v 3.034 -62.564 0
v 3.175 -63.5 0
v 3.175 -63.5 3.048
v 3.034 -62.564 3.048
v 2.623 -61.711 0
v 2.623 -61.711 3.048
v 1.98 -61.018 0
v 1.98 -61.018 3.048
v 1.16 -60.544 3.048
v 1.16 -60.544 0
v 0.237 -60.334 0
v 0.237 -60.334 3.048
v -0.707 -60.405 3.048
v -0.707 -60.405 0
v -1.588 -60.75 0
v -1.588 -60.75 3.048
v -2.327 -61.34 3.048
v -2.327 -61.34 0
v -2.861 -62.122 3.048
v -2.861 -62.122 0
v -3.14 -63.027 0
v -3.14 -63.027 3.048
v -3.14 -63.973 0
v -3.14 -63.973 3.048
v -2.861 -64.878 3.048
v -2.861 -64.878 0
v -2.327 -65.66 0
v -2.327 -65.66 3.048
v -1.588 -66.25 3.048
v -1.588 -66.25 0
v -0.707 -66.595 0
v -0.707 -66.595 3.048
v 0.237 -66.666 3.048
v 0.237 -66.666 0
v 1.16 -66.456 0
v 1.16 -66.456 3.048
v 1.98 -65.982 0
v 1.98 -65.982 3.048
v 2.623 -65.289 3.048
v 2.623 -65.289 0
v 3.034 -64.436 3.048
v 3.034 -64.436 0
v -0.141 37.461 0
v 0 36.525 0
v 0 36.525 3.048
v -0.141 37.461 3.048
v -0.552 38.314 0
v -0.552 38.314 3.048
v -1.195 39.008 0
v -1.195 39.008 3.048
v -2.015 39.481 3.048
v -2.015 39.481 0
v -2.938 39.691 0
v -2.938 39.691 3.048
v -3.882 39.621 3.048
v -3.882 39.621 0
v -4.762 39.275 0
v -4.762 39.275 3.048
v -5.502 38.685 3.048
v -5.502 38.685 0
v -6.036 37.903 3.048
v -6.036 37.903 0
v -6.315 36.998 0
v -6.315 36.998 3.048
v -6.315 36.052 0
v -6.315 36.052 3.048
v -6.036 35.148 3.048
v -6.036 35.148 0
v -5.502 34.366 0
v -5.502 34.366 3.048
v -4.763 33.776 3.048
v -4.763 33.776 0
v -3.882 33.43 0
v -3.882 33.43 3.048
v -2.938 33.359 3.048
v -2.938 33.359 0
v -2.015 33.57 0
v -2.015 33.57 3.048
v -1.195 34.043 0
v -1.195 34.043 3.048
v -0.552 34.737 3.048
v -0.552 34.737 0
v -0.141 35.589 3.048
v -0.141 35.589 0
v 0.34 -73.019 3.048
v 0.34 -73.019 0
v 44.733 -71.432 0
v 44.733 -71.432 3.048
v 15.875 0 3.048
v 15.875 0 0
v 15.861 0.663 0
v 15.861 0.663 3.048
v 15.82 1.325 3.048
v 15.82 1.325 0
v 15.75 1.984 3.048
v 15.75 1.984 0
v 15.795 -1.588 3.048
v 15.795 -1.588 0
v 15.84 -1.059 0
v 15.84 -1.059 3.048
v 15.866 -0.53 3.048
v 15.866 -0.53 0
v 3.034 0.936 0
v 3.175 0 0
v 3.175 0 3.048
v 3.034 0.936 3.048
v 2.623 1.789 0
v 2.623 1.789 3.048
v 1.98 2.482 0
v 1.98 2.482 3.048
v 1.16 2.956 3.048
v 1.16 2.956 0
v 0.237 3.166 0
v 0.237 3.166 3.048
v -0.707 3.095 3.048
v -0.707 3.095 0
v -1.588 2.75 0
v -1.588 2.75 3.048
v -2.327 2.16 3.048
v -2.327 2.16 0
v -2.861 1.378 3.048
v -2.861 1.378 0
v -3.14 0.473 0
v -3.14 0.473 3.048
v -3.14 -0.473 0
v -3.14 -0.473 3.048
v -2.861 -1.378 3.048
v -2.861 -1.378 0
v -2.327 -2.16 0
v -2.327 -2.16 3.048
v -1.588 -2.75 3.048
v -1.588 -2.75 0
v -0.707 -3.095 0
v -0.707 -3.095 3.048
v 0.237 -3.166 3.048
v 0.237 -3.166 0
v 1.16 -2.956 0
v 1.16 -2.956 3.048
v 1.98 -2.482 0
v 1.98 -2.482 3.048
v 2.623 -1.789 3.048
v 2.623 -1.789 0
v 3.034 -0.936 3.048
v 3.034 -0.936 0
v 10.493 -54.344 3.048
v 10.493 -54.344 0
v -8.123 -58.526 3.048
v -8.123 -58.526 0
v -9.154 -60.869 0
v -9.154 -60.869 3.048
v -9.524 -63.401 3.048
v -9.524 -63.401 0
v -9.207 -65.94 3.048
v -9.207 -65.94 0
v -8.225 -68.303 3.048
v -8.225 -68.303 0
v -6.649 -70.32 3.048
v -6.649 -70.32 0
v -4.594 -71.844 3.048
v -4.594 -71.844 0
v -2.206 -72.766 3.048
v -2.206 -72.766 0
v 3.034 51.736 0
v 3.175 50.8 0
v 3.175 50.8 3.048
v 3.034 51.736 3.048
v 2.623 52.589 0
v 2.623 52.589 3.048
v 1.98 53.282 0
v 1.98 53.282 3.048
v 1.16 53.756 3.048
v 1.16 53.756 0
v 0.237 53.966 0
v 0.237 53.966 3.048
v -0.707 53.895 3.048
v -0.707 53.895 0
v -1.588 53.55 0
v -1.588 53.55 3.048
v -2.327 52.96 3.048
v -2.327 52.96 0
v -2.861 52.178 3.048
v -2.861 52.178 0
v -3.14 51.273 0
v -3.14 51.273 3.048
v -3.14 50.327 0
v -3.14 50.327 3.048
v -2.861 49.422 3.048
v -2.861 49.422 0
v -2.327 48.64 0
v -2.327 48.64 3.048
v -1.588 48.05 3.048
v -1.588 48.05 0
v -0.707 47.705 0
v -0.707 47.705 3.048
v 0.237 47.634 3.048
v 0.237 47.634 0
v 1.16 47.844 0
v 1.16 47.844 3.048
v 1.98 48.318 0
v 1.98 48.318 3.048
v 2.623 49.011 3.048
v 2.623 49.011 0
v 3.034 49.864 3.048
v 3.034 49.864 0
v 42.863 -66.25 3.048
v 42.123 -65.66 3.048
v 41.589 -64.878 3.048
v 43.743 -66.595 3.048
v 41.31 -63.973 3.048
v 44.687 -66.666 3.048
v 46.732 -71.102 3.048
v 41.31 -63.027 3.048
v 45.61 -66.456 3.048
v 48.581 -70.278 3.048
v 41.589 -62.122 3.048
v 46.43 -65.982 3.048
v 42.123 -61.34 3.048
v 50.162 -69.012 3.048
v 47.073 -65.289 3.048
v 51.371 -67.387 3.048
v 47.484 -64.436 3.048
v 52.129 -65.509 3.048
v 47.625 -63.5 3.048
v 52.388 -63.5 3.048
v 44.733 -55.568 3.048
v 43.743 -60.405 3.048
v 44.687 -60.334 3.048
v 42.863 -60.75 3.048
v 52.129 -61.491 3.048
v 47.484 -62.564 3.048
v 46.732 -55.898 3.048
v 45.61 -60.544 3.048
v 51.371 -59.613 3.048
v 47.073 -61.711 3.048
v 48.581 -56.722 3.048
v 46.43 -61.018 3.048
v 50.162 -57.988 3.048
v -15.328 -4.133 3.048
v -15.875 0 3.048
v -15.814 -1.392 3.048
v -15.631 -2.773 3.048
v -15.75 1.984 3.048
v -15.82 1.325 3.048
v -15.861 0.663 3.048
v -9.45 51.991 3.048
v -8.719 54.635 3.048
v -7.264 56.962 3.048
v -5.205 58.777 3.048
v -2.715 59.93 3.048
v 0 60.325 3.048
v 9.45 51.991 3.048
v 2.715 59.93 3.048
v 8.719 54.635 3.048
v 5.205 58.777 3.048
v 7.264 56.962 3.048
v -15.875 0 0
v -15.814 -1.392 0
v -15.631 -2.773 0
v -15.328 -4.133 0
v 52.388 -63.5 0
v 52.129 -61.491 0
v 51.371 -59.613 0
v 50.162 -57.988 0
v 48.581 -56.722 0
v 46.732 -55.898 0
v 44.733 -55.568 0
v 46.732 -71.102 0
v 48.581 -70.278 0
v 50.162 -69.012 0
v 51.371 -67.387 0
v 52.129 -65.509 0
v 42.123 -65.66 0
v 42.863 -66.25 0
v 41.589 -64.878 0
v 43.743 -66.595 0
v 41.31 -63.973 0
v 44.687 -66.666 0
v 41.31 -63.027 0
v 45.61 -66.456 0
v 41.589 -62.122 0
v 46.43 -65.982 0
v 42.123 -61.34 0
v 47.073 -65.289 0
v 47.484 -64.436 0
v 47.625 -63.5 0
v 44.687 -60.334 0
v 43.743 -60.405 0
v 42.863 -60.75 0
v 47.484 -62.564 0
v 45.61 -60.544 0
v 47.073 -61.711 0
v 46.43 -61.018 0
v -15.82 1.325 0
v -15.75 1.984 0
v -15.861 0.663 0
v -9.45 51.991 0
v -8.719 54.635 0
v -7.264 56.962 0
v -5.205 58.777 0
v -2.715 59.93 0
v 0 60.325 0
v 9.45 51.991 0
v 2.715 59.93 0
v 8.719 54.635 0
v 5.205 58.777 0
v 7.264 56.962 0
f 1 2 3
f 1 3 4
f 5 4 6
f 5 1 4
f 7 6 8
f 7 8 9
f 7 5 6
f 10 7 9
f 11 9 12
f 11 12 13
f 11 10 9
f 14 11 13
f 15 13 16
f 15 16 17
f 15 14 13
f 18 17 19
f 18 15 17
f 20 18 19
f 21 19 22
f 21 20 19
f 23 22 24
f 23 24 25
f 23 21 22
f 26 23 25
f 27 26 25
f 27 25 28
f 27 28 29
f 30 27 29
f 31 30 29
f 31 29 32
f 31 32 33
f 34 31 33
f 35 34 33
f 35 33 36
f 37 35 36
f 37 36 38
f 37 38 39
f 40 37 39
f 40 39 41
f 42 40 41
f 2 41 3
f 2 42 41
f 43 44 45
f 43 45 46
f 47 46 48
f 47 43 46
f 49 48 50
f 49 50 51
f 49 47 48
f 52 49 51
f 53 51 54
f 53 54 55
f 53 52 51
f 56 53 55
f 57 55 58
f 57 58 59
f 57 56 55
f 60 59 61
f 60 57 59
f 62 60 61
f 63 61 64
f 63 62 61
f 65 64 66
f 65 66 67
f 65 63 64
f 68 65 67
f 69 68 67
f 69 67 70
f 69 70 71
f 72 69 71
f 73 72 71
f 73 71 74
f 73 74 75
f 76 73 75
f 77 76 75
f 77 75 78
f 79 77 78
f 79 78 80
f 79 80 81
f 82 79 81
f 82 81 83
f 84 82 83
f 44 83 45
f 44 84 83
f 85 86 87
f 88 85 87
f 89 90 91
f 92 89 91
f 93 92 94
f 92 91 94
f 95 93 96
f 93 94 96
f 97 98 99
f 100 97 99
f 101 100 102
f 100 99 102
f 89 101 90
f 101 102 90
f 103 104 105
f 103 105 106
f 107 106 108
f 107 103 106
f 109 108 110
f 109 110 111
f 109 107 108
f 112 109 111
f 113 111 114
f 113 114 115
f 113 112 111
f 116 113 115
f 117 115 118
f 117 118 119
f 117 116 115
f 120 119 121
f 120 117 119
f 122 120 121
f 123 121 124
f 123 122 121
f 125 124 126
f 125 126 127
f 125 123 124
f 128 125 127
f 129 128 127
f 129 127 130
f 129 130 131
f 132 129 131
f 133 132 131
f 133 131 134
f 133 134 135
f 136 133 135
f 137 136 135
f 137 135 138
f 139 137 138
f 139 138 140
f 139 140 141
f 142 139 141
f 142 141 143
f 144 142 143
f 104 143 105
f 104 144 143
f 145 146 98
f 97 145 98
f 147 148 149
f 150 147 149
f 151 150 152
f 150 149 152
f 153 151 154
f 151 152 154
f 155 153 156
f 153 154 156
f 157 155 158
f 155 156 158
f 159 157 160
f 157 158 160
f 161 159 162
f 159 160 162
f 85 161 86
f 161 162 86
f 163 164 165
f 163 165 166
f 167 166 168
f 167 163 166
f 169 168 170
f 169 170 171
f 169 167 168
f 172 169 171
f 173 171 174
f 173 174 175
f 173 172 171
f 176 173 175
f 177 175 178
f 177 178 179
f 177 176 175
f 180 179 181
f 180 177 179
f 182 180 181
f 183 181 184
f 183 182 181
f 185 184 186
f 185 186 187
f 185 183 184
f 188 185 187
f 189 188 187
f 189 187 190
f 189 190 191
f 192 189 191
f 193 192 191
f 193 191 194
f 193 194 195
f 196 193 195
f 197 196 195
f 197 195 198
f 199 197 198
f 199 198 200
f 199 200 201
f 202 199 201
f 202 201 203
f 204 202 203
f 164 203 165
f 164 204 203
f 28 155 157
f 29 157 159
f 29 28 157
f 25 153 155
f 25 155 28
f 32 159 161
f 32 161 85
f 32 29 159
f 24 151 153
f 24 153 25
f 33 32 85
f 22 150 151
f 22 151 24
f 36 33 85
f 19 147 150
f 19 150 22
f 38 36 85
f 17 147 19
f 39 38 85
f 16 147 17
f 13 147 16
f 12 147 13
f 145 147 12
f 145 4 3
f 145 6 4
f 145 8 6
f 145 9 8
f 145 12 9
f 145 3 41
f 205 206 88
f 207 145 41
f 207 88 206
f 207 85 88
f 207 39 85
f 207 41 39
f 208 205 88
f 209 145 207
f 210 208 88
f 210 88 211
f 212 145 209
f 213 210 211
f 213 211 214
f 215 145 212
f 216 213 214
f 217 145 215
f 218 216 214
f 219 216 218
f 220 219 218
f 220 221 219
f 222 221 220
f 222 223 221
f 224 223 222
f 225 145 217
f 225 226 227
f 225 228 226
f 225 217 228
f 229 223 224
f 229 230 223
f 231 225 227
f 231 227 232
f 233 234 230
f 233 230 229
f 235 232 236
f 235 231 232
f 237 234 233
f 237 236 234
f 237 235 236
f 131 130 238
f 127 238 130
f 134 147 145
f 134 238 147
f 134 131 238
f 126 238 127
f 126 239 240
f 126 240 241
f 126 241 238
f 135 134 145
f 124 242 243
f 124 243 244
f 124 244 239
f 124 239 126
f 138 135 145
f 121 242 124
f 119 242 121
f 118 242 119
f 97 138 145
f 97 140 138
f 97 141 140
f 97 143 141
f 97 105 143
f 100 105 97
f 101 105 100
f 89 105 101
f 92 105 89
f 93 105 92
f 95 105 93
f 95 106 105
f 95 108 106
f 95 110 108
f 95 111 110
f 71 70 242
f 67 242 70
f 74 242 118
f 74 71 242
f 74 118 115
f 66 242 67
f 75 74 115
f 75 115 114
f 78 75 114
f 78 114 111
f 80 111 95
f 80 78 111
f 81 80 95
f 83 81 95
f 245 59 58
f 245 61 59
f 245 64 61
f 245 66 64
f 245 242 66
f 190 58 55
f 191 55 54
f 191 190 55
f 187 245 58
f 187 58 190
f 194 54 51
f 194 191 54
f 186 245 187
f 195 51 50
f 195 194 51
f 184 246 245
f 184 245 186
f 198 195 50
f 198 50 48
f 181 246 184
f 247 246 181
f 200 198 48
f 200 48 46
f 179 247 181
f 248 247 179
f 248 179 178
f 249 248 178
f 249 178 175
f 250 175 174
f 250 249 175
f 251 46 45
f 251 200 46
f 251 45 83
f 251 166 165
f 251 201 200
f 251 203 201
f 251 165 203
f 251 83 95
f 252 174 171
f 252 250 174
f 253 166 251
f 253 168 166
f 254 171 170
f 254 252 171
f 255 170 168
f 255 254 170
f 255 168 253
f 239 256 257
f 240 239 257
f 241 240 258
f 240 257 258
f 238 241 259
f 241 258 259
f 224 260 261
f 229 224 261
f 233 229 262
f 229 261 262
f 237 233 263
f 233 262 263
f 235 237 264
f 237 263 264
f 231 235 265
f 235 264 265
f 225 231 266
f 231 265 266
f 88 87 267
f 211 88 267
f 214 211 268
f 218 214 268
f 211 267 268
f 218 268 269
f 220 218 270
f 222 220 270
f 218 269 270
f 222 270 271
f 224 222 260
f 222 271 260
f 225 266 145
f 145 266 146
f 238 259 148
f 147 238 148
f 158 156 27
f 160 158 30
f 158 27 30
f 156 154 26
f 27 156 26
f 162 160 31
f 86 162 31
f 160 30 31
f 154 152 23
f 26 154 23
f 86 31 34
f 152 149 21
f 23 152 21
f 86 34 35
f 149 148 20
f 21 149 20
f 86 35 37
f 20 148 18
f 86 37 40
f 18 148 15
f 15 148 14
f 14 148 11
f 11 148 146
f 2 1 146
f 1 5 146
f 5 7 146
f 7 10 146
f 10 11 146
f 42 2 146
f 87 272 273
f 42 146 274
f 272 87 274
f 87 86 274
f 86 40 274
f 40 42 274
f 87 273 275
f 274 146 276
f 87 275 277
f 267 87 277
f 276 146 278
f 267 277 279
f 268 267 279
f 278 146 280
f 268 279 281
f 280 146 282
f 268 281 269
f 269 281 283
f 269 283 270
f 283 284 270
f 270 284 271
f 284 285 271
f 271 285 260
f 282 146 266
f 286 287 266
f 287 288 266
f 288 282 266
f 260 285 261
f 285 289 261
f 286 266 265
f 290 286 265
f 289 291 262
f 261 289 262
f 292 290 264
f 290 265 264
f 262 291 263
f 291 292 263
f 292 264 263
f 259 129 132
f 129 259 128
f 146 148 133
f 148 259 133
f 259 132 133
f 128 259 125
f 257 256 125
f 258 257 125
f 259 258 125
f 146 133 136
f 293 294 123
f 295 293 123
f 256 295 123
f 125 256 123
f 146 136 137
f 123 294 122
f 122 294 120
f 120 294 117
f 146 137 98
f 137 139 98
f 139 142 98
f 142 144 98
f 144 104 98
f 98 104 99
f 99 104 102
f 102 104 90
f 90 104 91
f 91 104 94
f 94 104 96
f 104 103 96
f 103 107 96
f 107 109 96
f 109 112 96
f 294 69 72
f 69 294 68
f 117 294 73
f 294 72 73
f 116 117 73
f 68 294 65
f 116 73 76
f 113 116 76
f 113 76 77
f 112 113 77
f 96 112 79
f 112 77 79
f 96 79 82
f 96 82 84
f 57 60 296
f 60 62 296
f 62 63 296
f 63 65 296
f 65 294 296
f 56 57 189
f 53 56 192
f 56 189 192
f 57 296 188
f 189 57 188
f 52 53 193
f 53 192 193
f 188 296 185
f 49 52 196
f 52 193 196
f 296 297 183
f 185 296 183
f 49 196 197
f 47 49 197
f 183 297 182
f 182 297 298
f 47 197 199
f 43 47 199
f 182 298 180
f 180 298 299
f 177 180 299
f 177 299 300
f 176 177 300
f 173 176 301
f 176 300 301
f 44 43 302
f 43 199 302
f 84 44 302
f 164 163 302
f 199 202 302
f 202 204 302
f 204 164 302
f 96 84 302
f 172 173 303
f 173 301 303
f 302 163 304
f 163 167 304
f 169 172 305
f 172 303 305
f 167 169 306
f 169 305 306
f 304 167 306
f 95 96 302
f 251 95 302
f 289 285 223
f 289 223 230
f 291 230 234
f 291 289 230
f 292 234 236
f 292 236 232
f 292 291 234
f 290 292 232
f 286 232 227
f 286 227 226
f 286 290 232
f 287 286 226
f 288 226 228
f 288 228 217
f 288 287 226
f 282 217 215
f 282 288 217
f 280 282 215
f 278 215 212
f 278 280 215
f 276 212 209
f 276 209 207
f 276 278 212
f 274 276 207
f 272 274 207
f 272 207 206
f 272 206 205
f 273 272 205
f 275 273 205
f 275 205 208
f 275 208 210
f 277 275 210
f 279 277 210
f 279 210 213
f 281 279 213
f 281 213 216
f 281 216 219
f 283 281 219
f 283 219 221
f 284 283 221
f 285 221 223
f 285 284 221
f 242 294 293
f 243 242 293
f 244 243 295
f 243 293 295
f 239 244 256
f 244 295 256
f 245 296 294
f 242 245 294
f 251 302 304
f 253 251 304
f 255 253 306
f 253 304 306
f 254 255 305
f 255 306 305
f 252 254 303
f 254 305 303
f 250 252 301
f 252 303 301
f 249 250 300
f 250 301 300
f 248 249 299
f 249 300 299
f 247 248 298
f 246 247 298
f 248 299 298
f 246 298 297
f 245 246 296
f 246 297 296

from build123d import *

# Parameters (mm, degrees)
F0_R     = 3.175
F1_DEPTH = 3.048


with BuildPart() as f1:
    # F0 (on Top) → F1 (new body)
    with BuildSketch(Plane.XY):
        with BuildLine():
            ThreePointArc((15.750488268, 1.9843750453), (-2.28e-08, 15.875), (-15.7504882737, 1.984375))
            ThreePointArc((-15.7504882737, 1.984375), (-15.8438414904, 0.9941387366), (-15.875, 0))
            Line((-15.875, 0), (-15.3276351094, -4.1327021368))
            ThreePointArc((-15.3276351094, -4.1327021368), (1.2939167116, -15.8221807771), (15.7954255641, -1.5875))
            ThreePointArc((15.7954255641, -1.5875), (15.8550939106, -0.7947465541), (15.875, 0))
            ThreePointArc((15.875, 0), (15.843841489, 0.9941387594), (15.750488268, 1.9843750453))
        make_face()
        Circle(F0_R, mode=Mode.SUBTRACT)
        with BuildLine():
            Line((-9.4502929642, 51.990625), (-15.7504882737, 1.984375))
            ThreePointArc((-15.7504882737, 1.984375), (-2.28e-08, 15.875), (15.750488268, 1.9843750453))
            Line((15.750488268, 1.9843750453), (9.4502929642, 51.990625))
            ThreePointArc((9.4502929642, 51.990625), (9.5063048942, 51.396483242), (9.525, 50.8))
            ThreePointArc((9.525, 50.8), (-0.596483242, 41.2936951058), (-9.4502929642, 51.990625))
        make_face()
        with Locations((-3.175, 36.5252)):
            Circle(F0_R, mode=Mode.SUBTRACT)
        with BuildLine():
            Line((-15.3276351094, -4.1327021368), (-15.875, 0))
            ThreePointArc((-15.875, 0), (-15.7375638579, -2.0843965119), (-15.3276351094, -4.1327021368))
        make_face()
        with BuildLine():
            ThreePointArc((9.4502929642, 51.990625), (0, 60.325), (-9.4502929642, 51.990625))
            ThreePointArc((-9.4502929642, 51.990625), (-0.596483242, 41.2936951058), (9.525, 50.8))
            ThreePointArc((9.525, 50.8), (9.5063048942, 51.396483242), (9.4502929642, 51.990625))
        make_face()
        with Locations((0, 50.8)):
            Circle(F0_R, mode=Mode.SUBTRACT)
        with BuildLine():
            ThreePointArc((15.7954255641, -1.5875), (1.2939167116, -15.8221807771), (-15.3276351094, -4.1327021368))
            Line((-15.3276351094, -4.1327021368), (-8.123344071, -58.5263789745))
            ThreePointArc((-8.123344071, -58.5263789745), (-4.506590709, -55.1085600055), (0.3401785714, -53.9810765556))
            Line((0.3401785714, -53.9810765556), (10.4932062399, -54.3439161633))
            Line((10.4932062399, -54.3439161633), (15.7954255641, -1.5875))
        make_face()
        with BuildLine():
            ThreePointArc((0.3401785714, -53.9810765556), (-4.506590709, -55.1085600055), (-8.123344071, -58.5263789745))
            ThreePointArc((-8.123344071, -58.5263789745), (-8.2251369351, -68.3034099762), (0.3401785714, -73.0189234444))
            ThreePointArc((0.3401785714, -73.0189234444), (6.5147068085, -70.448684782), (9.4772553384, -64.4525))
            ThreePointArc((9.4772553384, -64.4525), (9.5130563464, -63.9768479324), (9.525, -63.5))
            ThreePointArc((9.525, -63.5), (6.8544082857, -56.8861726622), (0.3401785714, -53.9810765556))
        make_face()
        with Locations((0, -63.5)):
            Circle(F0_R, mode=Mode.SUBTRACT)
        with BuildLine():
            Line((44.7334821429, -55.5675637964), (10.4932062399, -54.3439161633))
            Line((10.4932062399, -54.3439161633), (9.4772553384, -64.4525))
            ThreePointArc((9.4772553384, -64.4525), (6.5147068085, -70.448684782), (0.3401785714, -73.0189234444))
            Line((0.3401785714, -73.0189234444), (44.7334821429, -71.4324362036))
            ThreePointArc((44.7334821429, -71.4324362036), (36.5125, -63.5), (44.7334821429, -55.5675637964))
        make_face()
        with BuildLine():
            Line((9.4772553384, -64.4525), (10.4932062399, -54.3439161633))
            Line((10.4932062399, -54.3439161633), (0.3401785714, -53.9810765556))
            ThreePointArc((0.3401785714, -53.9810765556), (6.8544082857, -56.8861726622), (9.525, -63.5))
            ThreePointArc((9.525, -63.5), (9.5130563464, -63.9768479324), (9.4772553384, -64.4525))
        make_face()
        with BuildLine():
            ThreePointArc((52.3875, -63.5), (50.1620069047, -57.9884772185), (44.7334821429, -55.5675637964))
            ThreePointArc((44.7334821429, -55.5675637964), (36.5125, -63.5), (44.7334821429, -71.4324362036))
            ThreePointArc((44.7334821429, -71.4324362036), (50.1620069047, -69.0115227815), (52.3875, -63.5))
        make_face()
        with Locations((44.45, -63.5)):
            Circle(F0_R, mode=Mode.SUBTRACT)
    extrude(amount=F1_DEPTH)


solid = f1.part
